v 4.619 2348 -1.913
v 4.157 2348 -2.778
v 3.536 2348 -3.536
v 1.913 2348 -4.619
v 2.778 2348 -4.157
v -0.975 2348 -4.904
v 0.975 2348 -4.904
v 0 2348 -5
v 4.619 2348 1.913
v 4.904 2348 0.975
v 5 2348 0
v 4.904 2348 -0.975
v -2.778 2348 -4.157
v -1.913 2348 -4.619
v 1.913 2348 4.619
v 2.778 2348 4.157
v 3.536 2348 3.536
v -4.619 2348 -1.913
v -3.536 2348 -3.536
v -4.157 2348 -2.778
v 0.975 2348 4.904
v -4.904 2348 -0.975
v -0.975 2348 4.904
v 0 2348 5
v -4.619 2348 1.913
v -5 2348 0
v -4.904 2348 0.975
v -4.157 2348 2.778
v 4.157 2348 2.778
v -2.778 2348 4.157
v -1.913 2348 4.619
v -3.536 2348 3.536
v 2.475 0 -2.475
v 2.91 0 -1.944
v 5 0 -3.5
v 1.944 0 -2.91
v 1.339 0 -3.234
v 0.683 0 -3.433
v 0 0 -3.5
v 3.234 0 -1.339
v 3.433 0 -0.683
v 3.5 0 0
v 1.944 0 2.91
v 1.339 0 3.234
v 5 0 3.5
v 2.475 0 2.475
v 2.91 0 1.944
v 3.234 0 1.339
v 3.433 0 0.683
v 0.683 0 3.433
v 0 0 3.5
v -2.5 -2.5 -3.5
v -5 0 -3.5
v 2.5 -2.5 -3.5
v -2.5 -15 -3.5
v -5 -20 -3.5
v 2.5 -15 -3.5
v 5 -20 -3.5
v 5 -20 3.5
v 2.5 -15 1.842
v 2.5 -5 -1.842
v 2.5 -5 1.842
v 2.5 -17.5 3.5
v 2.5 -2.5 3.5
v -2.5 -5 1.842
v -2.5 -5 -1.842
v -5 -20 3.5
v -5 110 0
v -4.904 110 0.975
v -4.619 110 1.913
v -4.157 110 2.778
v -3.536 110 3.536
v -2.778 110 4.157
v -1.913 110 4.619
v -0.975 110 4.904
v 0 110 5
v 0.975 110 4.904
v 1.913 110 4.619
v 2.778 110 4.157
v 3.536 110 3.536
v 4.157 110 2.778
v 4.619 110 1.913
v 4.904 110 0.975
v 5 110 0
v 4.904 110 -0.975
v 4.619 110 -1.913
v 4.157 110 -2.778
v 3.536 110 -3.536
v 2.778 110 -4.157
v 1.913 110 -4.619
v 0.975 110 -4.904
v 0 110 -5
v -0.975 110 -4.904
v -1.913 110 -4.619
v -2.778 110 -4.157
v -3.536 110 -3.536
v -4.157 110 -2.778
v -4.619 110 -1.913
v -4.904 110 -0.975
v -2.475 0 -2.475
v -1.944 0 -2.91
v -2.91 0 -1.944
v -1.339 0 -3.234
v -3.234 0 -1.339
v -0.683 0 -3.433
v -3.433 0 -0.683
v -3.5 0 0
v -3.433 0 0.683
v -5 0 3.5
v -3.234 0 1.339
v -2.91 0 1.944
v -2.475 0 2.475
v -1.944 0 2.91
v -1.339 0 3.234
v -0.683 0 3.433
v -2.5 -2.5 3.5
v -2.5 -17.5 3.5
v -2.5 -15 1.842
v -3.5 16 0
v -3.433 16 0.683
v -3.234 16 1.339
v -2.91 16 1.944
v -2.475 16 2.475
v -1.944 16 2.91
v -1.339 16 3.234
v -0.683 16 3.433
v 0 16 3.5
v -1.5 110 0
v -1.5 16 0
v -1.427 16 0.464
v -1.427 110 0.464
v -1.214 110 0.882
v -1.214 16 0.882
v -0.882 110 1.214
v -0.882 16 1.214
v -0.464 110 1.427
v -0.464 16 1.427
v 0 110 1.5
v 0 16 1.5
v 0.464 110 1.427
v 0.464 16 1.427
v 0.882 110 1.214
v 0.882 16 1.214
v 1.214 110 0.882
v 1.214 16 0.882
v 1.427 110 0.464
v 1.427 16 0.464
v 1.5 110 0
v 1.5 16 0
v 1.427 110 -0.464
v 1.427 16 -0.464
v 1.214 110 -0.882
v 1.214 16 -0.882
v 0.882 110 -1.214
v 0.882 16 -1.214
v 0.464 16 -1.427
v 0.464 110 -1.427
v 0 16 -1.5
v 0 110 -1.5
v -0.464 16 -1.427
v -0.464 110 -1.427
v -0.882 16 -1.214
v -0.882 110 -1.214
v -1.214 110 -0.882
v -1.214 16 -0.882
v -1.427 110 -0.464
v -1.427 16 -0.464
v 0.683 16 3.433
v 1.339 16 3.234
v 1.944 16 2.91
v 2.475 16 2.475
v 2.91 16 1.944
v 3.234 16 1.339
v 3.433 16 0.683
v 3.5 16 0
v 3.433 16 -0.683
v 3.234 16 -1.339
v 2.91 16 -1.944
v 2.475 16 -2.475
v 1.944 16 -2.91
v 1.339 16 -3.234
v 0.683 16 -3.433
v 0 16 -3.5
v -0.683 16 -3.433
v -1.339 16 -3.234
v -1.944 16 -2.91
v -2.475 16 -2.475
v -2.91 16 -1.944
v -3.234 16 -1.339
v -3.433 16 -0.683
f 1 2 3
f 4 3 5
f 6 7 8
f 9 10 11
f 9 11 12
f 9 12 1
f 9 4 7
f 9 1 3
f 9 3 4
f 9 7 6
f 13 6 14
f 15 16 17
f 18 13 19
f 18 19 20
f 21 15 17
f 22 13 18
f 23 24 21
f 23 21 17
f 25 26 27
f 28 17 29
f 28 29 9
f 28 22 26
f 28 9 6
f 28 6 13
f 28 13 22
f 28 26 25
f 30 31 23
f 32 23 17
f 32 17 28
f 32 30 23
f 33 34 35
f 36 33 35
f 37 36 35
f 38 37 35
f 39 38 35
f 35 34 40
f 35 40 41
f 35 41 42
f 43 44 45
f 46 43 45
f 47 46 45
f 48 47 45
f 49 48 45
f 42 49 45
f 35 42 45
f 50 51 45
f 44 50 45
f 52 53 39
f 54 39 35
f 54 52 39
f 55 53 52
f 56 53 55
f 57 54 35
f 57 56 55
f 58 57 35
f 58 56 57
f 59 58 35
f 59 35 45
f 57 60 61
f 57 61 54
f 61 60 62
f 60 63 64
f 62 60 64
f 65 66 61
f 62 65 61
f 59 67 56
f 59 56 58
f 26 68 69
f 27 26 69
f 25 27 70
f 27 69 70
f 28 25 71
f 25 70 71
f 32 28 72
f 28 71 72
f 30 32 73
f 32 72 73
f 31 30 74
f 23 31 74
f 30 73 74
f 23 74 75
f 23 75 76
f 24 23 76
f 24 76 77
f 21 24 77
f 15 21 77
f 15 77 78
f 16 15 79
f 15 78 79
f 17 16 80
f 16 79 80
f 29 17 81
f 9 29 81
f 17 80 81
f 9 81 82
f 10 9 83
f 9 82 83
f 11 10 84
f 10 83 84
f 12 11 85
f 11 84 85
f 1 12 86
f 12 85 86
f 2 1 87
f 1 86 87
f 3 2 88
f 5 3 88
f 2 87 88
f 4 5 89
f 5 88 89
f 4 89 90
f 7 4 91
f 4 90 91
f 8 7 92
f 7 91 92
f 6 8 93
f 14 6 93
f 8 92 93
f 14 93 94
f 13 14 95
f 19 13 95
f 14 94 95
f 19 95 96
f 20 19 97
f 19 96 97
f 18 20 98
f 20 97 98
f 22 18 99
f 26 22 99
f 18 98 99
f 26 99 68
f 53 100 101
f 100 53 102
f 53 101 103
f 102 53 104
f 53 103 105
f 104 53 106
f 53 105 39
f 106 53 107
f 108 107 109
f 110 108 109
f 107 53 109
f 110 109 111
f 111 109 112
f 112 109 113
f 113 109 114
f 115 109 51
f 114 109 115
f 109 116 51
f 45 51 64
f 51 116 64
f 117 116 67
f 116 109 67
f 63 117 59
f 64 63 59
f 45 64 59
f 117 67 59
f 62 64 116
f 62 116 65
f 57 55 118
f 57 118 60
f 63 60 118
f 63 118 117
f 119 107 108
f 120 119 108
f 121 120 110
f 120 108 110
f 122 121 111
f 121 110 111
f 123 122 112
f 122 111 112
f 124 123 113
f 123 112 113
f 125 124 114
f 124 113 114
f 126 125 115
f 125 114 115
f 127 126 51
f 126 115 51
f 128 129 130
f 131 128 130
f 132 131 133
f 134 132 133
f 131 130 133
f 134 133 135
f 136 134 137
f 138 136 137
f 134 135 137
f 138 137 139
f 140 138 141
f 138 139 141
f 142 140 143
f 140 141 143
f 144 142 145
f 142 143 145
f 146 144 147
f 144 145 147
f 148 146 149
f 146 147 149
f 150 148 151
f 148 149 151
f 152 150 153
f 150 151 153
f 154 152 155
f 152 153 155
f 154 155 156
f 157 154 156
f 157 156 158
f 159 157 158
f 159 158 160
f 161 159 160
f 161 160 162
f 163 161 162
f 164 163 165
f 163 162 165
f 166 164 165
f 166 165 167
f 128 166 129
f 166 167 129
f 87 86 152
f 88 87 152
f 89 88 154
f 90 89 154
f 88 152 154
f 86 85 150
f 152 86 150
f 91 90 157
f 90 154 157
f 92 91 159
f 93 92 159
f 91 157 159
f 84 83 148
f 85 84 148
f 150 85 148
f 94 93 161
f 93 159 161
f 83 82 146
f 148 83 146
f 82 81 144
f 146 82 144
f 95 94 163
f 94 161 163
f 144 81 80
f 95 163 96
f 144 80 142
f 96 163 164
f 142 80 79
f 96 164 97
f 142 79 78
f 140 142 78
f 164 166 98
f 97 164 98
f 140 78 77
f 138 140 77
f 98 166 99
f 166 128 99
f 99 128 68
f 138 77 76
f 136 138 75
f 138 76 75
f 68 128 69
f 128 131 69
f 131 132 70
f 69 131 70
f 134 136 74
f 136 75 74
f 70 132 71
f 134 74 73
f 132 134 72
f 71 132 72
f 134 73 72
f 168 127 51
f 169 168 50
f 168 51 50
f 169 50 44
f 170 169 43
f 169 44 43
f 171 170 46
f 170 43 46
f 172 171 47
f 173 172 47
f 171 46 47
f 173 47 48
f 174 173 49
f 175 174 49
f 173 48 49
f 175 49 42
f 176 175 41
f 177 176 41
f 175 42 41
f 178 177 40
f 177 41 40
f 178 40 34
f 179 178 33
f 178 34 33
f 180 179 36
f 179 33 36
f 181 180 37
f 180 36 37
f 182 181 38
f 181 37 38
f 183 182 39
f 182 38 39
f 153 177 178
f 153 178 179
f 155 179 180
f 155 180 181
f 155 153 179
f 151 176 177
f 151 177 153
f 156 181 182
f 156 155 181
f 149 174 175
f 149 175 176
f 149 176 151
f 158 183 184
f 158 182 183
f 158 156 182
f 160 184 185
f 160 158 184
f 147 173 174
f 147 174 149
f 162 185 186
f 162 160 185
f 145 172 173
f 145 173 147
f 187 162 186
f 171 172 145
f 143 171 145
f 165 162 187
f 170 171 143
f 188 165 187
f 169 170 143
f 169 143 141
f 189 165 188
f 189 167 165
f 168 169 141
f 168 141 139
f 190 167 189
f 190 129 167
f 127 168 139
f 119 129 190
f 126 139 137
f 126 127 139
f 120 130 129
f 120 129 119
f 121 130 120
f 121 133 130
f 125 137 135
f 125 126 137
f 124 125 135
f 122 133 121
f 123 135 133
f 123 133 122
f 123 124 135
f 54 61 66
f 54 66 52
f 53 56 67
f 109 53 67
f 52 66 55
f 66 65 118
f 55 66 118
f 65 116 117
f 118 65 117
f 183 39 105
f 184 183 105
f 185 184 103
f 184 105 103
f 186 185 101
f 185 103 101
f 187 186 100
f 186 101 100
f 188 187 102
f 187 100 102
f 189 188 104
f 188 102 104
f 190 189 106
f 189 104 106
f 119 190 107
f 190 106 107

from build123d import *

# Parameters (mm, degrees)
F0_W      = 10
F0_H      = 7
F1_DEPTH  = 20
F2_W      = 5
F2_H      = 16
F3_DEPTH  = 7
F4_W      = 5
F4_H      = 3
F5_DEPTH  = 7
F7_DEPTH  = 5
F9_DEPTH  = 16
F10_R     = 1.5
F11_DEPTH = 94
F12_R     = 5
F13_DEPTH = 2238


with BuildPart() as f1:
    # F0 (on Front) → F1 (new body)
    with BuildSketch(Plane.XZ):
        Rectangle(F0_W, F0_H)
    extrude(amount=F1_DEPTH)

    # F2 (on face) → F3 (cut, through all)
    with BuildSketch(Plane.XY.offset(3.5)):
        with Locations((0, -10)):
            Rectangle(F2_W, F2_H)
    extrude(amount=-F3_DEPTH, mode=Mode.SUBTRACT)

    # F4 (on face) → F5 (join, through all)
    with BuildSketch(Plane(origin=(0, 0, -3.5), x_dir=(1, 0, 0), z_dir=(0, 0, -1))):
        with Locations((0, 3.5)):
            Rectangle(F4_W, F4_H)
        with Locations((0, 16.5)):
            Rectangle(F4_W, F4_H)
    extrude(amount=-F5_DEPTH)

    # F6 (on face) → F7 (cut, through all)
    with BuildSketch(Plane(origin=(2.5, 0, 0), x_dir=(0, -1, 0), z_dir=(-1, 0, 0))):
        Polygon((2.5, 3.5), (5, 1.841688), (5, 3.5), align=None)
        Polygon((2.5, -3.5), (5, -3.5), (5, -1.841688), align=None)
        Polygon((17.5, 3.5), (15, 3.5), (15, 1.841688), align=None)
    extrude(amount=F7_DEPTH, mode=Mode.SUBTRACT)

    # F8 (on face) → F9 (join)
    with BuildSketch(Plane(origin=(0, 0, 0), x_dir=(-1, 0, 0), z_dir=(0, 1, 0))):
        with BuildLine():
            ThreePointArc((0, -3.5), (2.474874, -2.474874), (3.5, 0))
            ThreePointArc((3.5, 0), (2.474874, 2.474874), (0, 3.5))
            ThreePointArc((0, 3.5), (-3.5, 0), (0, -3.5))
        make_face()
    extrude(amount=F9_DEPTH)

    # F10 (on face) → F11 (join)
    with BuildSketch(Plane(origin=(0, 16, 0), x_dir=(-1, 0, 0), z_dir=(0, 1, 0))):
        Circle(F10_R)
    extrude(amount=F11_DEPTH)

    # F12 (on face) → F13 (join)
    with BuildSketch(Plane(origin=(0, 110, 0), x_dir=(-1, 0, 0), z_dir=(0, 1, 0))):
        Circle(F12_R)
    extrude(amount=F13_DEPTH)


solid = f1.part
